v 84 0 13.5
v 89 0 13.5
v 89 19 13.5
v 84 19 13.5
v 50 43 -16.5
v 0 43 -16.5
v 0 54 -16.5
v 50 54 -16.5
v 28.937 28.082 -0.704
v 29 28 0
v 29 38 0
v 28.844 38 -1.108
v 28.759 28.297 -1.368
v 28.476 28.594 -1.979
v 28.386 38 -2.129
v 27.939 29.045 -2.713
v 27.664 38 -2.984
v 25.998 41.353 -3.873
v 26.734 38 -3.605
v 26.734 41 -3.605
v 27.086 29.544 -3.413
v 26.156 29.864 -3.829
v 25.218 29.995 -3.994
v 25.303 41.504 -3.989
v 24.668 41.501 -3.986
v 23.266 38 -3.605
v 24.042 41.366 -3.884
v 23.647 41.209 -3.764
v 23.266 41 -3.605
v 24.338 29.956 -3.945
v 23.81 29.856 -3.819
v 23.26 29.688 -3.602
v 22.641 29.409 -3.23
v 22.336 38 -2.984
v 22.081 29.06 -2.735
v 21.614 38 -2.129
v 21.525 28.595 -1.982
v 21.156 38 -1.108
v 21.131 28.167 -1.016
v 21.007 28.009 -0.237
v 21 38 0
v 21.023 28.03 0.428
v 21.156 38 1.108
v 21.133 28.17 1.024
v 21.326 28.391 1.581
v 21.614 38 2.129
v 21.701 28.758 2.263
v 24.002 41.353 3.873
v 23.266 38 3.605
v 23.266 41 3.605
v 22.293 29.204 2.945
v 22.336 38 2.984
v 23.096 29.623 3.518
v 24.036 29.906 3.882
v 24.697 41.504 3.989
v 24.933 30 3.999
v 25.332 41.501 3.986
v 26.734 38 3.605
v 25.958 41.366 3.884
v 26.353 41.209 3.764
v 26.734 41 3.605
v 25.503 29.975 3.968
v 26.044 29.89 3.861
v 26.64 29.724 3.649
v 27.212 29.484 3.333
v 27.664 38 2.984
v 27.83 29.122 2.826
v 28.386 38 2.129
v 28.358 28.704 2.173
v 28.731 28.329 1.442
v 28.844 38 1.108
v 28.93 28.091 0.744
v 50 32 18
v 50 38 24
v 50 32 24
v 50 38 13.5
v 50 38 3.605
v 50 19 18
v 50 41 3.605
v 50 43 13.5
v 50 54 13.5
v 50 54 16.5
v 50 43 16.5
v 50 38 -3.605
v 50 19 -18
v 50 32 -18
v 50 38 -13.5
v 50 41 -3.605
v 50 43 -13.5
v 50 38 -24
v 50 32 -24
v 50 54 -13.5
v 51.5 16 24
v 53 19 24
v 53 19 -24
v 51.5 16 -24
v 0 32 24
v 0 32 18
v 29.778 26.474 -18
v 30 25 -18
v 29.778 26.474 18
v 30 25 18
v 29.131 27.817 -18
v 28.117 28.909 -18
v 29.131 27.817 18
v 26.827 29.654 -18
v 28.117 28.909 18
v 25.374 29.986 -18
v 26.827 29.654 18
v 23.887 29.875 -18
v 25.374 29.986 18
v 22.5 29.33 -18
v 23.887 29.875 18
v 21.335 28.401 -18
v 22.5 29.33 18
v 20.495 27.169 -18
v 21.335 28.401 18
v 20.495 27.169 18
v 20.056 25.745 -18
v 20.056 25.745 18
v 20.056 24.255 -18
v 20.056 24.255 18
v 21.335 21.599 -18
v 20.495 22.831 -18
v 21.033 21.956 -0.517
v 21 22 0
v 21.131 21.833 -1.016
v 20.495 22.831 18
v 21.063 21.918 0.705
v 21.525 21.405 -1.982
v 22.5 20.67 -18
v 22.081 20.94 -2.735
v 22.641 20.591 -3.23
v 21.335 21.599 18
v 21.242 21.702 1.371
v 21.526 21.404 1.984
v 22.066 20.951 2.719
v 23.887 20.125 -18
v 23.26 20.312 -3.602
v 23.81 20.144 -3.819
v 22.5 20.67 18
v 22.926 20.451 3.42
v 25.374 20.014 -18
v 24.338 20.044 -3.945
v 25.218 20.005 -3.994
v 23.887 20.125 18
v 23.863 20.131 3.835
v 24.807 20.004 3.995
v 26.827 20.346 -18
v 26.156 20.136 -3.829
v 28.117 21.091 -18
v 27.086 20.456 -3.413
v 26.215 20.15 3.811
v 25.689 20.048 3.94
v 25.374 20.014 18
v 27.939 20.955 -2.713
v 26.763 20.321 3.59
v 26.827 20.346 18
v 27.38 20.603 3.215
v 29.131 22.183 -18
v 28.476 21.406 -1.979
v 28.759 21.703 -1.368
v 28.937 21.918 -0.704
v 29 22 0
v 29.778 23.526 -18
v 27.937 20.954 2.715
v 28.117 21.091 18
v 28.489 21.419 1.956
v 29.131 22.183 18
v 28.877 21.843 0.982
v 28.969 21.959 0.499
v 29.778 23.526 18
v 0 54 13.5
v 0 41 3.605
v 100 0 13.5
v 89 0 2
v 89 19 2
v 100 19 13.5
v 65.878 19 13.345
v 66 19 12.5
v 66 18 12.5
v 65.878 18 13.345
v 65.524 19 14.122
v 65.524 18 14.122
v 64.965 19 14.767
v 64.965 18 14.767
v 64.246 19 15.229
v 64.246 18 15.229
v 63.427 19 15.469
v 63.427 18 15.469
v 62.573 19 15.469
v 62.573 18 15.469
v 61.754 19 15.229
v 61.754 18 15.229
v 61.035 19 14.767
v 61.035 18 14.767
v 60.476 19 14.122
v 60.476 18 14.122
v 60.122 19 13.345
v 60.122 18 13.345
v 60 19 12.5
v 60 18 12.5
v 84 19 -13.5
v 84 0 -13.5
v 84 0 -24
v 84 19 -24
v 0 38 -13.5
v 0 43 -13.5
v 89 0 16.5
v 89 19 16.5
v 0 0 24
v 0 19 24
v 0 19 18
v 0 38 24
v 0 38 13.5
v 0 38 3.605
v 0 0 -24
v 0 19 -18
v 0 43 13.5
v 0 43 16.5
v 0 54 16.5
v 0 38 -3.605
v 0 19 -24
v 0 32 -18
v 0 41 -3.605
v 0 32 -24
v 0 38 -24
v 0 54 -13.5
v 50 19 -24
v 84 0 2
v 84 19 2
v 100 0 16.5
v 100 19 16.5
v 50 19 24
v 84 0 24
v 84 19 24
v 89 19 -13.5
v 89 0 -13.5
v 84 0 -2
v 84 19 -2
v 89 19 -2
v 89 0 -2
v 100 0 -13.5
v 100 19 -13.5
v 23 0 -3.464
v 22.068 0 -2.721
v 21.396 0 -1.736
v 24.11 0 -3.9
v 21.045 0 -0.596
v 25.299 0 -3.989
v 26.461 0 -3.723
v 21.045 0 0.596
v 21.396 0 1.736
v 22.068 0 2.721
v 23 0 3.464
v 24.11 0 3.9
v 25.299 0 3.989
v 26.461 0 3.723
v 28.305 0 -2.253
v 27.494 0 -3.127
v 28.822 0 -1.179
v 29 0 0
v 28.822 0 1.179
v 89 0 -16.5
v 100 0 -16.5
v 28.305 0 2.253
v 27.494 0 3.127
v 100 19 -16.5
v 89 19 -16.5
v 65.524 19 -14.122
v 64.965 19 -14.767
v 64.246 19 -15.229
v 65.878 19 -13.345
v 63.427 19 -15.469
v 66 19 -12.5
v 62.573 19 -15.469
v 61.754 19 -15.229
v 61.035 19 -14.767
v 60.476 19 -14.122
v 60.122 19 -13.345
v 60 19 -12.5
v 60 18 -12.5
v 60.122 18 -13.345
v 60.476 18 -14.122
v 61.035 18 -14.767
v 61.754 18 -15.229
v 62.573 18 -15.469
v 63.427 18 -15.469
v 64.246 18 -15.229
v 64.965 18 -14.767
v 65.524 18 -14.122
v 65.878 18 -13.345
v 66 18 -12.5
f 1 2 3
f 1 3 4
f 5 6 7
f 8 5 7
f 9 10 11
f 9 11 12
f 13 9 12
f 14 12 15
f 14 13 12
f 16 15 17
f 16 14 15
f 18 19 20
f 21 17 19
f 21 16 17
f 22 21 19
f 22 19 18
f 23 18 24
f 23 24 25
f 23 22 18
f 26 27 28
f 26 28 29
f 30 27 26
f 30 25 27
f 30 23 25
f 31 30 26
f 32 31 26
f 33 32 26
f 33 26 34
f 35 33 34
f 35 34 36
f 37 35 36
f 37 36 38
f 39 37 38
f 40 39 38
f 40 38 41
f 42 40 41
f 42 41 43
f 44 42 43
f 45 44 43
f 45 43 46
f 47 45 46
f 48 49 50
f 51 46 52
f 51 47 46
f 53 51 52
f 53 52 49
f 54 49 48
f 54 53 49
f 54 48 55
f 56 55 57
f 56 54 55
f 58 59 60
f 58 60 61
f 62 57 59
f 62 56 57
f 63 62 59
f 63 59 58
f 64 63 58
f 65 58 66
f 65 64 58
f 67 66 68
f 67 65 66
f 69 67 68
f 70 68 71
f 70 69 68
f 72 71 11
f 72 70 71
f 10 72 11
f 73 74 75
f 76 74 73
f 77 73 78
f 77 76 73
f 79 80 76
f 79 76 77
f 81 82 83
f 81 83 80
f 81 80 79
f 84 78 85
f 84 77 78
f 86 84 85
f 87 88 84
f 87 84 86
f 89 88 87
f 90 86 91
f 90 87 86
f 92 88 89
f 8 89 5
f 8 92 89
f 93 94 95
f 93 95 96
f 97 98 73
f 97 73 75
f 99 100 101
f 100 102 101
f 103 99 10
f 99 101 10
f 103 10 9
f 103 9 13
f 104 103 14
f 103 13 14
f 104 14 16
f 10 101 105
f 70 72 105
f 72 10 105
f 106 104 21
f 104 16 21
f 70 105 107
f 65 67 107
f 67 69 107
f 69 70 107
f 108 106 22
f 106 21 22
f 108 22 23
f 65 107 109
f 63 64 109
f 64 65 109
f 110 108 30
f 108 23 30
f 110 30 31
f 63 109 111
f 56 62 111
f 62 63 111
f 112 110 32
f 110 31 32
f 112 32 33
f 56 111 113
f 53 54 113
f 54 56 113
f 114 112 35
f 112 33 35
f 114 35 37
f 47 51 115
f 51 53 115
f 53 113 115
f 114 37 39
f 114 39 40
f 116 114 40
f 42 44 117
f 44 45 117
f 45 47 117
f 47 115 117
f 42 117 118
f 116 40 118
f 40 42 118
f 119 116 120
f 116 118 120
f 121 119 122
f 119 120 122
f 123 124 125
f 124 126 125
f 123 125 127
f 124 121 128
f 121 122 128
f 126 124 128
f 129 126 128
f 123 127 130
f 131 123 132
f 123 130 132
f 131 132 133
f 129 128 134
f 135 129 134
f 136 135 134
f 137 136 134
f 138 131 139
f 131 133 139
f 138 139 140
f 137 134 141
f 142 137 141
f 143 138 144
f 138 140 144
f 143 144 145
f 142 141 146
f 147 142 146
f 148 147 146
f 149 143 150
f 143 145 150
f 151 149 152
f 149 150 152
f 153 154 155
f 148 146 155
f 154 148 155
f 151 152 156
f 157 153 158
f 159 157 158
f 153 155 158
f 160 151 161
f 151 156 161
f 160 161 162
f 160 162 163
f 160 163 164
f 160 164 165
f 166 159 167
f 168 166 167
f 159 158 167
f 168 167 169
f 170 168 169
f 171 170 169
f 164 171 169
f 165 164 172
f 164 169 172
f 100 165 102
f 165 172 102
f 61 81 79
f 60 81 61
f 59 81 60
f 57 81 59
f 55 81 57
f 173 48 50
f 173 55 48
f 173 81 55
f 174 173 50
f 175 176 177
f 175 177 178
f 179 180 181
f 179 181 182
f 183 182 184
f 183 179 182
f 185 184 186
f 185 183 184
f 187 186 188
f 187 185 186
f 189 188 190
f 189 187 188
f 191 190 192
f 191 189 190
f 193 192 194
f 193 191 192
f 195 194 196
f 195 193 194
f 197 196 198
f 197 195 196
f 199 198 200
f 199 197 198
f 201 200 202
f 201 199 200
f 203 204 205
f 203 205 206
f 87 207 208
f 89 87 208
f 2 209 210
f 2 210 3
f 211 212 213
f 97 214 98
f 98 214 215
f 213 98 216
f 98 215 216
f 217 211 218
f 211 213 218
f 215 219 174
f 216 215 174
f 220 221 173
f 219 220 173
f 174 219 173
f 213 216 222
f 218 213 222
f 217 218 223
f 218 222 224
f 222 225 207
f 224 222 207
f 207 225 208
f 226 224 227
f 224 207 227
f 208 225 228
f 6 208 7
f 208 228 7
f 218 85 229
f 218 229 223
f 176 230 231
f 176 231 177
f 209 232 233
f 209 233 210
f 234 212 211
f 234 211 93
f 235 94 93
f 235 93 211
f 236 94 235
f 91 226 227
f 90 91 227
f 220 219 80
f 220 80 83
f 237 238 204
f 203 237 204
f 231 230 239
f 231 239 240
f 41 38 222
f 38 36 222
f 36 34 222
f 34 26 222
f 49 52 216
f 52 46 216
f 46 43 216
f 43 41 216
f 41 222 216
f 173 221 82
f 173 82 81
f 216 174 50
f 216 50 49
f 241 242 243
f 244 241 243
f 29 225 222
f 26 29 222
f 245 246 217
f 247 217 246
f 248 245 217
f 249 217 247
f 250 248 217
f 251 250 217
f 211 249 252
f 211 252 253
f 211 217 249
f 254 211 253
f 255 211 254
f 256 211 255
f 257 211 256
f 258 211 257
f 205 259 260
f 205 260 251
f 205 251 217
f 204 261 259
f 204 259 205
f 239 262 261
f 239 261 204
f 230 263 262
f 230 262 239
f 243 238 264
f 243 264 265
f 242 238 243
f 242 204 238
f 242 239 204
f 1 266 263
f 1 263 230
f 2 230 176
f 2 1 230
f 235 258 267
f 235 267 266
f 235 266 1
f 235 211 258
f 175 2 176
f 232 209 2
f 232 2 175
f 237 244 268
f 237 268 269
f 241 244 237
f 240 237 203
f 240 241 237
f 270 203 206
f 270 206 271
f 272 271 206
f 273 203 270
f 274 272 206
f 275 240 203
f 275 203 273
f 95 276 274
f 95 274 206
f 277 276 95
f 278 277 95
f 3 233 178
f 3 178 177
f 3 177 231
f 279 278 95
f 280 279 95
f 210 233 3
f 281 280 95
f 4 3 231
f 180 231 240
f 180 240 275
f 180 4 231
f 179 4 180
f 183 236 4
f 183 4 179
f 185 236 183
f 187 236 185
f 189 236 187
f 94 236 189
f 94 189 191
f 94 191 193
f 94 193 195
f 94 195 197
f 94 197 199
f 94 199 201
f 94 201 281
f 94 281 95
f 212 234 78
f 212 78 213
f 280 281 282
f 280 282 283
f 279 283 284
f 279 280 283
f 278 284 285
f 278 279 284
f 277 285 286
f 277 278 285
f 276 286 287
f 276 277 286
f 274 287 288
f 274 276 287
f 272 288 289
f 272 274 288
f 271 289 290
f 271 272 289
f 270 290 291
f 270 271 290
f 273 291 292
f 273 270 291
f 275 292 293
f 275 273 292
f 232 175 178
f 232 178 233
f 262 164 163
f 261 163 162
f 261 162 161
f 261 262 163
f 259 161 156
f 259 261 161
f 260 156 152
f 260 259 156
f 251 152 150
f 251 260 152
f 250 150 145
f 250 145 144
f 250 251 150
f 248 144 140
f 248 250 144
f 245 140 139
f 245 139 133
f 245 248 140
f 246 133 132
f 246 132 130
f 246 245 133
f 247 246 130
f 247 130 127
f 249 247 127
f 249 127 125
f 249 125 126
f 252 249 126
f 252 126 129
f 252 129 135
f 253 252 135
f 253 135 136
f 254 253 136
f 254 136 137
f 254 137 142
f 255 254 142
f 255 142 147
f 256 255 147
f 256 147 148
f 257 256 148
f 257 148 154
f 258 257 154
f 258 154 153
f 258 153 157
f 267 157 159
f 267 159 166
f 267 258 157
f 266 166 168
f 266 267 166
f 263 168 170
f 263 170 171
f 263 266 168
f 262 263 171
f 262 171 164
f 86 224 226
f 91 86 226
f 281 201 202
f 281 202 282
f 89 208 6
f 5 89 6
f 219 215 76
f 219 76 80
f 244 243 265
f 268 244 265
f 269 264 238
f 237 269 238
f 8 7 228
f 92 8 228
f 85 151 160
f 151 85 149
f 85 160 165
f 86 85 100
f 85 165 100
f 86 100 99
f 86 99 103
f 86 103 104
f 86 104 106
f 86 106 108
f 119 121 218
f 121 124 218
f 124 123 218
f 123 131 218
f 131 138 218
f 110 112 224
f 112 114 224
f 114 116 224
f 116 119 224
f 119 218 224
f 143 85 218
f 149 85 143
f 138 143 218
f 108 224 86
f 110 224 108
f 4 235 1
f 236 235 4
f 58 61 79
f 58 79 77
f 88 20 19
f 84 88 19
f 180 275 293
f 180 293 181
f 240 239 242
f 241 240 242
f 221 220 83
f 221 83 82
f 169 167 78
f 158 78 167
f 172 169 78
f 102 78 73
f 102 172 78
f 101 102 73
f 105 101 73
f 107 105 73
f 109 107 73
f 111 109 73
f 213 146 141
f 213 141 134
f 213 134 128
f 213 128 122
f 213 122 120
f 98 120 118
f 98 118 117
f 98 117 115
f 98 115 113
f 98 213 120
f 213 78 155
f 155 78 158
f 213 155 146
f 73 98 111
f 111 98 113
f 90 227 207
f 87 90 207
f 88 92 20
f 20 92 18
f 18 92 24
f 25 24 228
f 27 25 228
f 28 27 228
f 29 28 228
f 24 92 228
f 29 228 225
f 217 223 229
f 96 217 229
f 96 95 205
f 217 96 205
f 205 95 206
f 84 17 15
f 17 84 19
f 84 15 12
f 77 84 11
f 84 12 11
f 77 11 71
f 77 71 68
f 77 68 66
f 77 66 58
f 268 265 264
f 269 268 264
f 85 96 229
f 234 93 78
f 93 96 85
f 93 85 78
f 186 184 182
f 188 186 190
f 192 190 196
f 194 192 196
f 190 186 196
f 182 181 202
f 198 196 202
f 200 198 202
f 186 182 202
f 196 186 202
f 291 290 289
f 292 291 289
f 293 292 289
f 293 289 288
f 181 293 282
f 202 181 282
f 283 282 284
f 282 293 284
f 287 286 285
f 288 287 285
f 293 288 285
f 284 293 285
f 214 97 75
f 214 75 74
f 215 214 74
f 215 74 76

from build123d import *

# Parameters (mm, degrees)
BOSS_EXTRUDE2_DEPTH     = 24
BOSS_EXTRUDE3_DEPTH     = 19
CUT_EXTRUDE1_DEPTH      = 1
BOSS_EXTRUDE4_DEPTH     = 50
SKETCH5_R               = 4
CUT_EXTRUDE2_DEPTH      = 55
SKETCH6_R               = 5
CUT_EXTRUDE3_DEPTH      = 25
CUT_EXTRUDE3_DEPTH_BACK = 25


with BuildPart() as part:
    # Sketch1 → Boss-Extrude2 (new body, symmetric)
    with BuildSketch(Plane.XY):
        Polygon((0, 0), (84, 0), (84, 19), (53, 19), (51.5, 16), (50, 19), (0, 19), align=None)
    extrude(amount=BOSS_EXTRUDE2_DEPTH, both=True)

    # Sketch2 → Boss-Extrude3 (add)
    with BuildSketch(Plane(origin=(0, 0, 0), x_dir=(1, 0, 0), z_dir=(0, 1, 0))):
        Polygon((84, 2), (89, 2), (100, 13.5), (100, 16.5), (89, 16.5), (89, 13.5), (84, 13.5), align=None)
    boss_extrude3 = extrude(amount=BOSS_EXTRUDE3_DEPTH)

    # Mirror1: Boss-Extrude3 across plane
    add(boss_extrude3.mirror(Plane.XY))

    # Sketch3 → Cut-Extrude1 (cut)
    with BuildSketch(Plane(origin=(0, 19, 0), x_dir=(1, 0, 0), z_dir=(0, 1, 0))):
        with BuildLine():
            Line((66, 12.5), (66, -12.5))
            ThreePointArc((66, -12.5), (63, -15.5), (60, -12.5))
            Line((60, -12.5), (60, 12.5))
            ThreePointArc((60, 12.5), (63, 15.5), (66, 12.5))
        make_face()
    extrude(amount=-CUT_EXTRUDE1_DEPTH, mode=Mode.SUBTRACT)

    # Sketch4 → Boss-Extrude4 (add)
    with BuildSketch(Plane(origin=(0, 0, 0), x_dir=(0, 0, -1), z_dir=(1, 0, 0))):
        Polygon((-18, 19), (-18, 32), (-24, 32), (-24, 38), (-13.5, 38), (-13.5, 43), (-16.5, 43), (-16.5, 54), (-13.5, 54), (-3.604820816, 41), (-3.604820816, 38), (0, 38), (0, 19), align=None)
    boss_extrude4 = extrude(amount=BOSS_EXTRUDE4_DEPTH)

    # Mirror2: Boss-Extrude4 across plane
    add(boss_extrude4.mirror(Plane.XY))

    # Sketch5 → Cut-Extrude2 (cut, through all)
    with BuildSketch(Plane(origin=(0, 0, 0), x_dir=(1, 0, 0), z_dir=(0, 1, 0))):
        with Locations((25, 0)):
            Circle(SKETCH5_R)
    extrude(amount=CUT_EXTRUDE2_DEPTH, mode=Mode.SUBTRACT)

    # Sketch6 → Cut-Extrude3 (cut, two sides)
    with BuildSketch(Plane.XY) as cut_extrude3_sk:
        with Locations((25, 25)):
            Circle(SKETCH6_R)
    extrude(amount=CUT_EXTRUDE3_DEPTH, mode=Mode.SUBTRACT)
    extrude(cut_extrude3_sk.sketch, amount=-CUT_EXTRUDE3_DEPTH_BACK, mode=Mode.SUBTRACT)


solid = part.part
